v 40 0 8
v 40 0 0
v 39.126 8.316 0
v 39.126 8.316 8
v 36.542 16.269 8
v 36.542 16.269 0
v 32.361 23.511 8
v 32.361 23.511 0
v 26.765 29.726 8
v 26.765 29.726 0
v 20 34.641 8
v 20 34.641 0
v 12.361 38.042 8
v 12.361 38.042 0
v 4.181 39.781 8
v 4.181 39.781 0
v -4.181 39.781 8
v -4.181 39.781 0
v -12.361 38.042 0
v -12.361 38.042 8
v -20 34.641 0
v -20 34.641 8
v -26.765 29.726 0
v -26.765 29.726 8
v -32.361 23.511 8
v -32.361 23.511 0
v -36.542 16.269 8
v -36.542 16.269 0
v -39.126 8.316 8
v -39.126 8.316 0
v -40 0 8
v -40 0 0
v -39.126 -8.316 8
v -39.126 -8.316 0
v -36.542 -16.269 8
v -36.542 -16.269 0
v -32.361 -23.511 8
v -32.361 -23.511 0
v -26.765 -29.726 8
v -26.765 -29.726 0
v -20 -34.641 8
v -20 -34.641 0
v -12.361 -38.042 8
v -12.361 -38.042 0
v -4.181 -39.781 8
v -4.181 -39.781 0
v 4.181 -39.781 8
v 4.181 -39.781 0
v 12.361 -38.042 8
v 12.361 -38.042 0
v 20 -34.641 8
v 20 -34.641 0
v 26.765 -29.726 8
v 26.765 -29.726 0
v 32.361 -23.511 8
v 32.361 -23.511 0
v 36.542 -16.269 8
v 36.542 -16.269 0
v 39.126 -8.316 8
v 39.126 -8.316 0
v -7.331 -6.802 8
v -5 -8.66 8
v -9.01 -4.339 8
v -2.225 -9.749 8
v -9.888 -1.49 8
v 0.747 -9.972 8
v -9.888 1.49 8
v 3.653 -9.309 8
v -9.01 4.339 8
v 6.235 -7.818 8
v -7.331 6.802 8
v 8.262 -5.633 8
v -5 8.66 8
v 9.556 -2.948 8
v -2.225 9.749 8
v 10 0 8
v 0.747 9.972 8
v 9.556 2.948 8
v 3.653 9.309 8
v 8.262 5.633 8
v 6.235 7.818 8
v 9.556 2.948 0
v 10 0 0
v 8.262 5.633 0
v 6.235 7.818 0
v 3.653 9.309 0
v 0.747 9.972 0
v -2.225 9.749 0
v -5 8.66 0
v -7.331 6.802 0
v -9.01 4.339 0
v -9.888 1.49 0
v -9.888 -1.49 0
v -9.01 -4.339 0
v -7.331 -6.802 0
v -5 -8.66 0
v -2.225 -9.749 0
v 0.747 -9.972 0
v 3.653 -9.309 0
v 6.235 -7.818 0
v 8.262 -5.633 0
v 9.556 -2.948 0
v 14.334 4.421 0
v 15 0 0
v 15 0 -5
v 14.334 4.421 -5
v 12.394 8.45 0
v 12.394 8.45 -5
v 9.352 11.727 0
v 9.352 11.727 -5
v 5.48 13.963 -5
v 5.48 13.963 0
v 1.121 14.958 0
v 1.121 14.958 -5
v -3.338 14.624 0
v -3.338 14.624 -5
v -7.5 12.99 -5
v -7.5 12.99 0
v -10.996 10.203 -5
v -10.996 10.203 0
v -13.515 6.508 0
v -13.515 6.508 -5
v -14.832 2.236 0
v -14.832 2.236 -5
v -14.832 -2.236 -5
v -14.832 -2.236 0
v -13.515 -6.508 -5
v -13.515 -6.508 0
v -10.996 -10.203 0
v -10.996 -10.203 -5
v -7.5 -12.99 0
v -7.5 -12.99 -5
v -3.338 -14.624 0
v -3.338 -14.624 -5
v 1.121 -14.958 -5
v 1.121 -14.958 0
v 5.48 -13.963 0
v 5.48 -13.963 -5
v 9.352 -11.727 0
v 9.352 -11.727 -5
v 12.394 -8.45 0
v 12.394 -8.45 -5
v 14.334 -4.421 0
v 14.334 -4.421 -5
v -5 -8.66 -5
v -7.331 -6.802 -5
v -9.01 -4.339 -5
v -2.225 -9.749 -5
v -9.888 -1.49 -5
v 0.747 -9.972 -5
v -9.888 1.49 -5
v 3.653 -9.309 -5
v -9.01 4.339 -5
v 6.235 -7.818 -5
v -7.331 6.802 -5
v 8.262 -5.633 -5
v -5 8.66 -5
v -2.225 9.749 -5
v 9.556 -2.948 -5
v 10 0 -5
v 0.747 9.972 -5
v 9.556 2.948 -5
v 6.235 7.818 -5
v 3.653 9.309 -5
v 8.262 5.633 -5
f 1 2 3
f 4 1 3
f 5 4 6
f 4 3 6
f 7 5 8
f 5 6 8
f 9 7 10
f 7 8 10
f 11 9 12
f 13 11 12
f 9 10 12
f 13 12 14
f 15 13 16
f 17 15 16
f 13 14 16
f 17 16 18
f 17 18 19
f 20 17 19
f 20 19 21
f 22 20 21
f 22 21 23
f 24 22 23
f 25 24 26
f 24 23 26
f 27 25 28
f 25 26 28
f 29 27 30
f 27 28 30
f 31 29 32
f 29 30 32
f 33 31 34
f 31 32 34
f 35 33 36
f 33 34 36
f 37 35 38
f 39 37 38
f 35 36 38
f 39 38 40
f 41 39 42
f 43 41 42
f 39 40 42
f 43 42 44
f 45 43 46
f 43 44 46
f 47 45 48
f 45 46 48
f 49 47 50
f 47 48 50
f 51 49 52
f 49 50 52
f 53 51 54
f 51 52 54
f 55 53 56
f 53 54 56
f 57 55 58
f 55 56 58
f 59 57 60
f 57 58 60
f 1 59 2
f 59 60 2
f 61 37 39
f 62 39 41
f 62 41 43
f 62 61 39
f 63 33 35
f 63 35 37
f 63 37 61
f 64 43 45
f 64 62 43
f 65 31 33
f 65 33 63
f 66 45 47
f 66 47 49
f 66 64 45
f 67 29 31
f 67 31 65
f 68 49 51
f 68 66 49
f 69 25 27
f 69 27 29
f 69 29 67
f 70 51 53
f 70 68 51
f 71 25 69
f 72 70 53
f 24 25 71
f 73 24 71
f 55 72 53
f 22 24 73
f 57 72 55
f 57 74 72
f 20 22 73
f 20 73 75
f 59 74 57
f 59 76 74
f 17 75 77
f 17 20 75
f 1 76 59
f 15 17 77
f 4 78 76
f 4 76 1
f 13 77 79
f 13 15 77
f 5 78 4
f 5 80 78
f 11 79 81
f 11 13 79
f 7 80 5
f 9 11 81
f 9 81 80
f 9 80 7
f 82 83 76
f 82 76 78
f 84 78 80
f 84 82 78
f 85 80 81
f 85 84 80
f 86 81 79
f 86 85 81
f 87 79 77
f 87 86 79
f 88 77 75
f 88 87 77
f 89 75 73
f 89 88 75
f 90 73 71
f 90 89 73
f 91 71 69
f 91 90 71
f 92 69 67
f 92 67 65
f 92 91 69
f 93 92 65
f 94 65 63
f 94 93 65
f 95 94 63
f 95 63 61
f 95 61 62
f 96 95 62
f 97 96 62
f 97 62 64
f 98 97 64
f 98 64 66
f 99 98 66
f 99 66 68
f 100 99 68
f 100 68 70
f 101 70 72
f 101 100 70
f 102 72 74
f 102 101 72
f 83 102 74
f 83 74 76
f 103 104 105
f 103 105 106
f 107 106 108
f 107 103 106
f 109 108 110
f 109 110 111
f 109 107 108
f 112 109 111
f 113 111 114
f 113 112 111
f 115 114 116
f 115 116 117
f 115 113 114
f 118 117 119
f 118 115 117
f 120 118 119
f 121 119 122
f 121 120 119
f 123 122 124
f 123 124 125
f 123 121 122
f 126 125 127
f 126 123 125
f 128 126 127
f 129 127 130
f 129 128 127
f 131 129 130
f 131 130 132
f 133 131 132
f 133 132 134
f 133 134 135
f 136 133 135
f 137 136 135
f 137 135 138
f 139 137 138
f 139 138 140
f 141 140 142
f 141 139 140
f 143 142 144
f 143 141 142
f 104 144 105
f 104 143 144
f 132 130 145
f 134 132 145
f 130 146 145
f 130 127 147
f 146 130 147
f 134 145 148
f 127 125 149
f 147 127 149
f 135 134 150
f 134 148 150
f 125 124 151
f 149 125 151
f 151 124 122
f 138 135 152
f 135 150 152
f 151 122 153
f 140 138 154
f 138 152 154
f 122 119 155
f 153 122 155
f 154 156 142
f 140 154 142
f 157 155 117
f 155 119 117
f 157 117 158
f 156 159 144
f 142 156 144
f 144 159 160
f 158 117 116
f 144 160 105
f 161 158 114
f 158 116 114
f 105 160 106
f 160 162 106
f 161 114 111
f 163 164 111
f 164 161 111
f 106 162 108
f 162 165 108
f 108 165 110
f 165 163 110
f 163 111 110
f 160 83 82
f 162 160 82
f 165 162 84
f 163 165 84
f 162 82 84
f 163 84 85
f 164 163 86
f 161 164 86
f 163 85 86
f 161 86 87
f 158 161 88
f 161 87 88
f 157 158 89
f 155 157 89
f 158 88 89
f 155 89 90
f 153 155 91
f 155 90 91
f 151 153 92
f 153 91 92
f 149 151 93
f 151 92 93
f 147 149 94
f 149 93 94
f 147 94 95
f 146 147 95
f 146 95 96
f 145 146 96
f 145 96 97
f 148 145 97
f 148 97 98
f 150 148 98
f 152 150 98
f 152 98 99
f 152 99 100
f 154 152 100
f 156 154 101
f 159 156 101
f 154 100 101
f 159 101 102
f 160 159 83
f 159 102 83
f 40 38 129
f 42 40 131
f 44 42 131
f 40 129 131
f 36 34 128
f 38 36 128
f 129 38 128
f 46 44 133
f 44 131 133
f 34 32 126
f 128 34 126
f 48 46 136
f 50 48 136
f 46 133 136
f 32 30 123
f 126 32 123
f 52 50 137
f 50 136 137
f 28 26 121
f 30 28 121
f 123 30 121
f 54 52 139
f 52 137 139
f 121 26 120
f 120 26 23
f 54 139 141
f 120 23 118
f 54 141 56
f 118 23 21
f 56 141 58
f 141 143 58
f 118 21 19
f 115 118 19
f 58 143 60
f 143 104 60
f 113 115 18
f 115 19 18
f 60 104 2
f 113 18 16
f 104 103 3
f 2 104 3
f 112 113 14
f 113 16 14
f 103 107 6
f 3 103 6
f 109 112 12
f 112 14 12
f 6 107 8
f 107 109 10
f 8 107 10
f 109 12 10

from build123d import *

# Parameters (mm, degrees)
F0_R     = 40
F0_R_2   = 15
F0_R_3   = 10
F1_DEPTH = 8
F2_DEPTH = 5
F3_DEPTH = 5.001


with BuildPart() as f1:
    # F0 (on Top) → F1 (new body)
    with BuildSketch(Plane.XY):
        Circle(F0_R)
        Circle(F0_R_2, mode=Mode.SUBTRACT)
        Circle(F0_R_2)
        Circle(F0_R_3, mode=Mode.SUBTRACT)
    extrude(amount=F1_DEPTH)

    # F0 (on Top) → F2 (join)
    with BuildSketch(Plane.XY):
        Circle(F0_R_2)
        Circle(F0_R_3, mode=Mode.SUBTRACT)
    extrude(amount=-F2_DEPTH)

    # F0 (on Top) → F3 (cut, through all)
    with BuildSketch(Plane.XY):
        Circle(F0_R_3)
    extrude(amount=-F3_DEPTH, mode=Mode.SUBTRACT)


solid = f1.part
